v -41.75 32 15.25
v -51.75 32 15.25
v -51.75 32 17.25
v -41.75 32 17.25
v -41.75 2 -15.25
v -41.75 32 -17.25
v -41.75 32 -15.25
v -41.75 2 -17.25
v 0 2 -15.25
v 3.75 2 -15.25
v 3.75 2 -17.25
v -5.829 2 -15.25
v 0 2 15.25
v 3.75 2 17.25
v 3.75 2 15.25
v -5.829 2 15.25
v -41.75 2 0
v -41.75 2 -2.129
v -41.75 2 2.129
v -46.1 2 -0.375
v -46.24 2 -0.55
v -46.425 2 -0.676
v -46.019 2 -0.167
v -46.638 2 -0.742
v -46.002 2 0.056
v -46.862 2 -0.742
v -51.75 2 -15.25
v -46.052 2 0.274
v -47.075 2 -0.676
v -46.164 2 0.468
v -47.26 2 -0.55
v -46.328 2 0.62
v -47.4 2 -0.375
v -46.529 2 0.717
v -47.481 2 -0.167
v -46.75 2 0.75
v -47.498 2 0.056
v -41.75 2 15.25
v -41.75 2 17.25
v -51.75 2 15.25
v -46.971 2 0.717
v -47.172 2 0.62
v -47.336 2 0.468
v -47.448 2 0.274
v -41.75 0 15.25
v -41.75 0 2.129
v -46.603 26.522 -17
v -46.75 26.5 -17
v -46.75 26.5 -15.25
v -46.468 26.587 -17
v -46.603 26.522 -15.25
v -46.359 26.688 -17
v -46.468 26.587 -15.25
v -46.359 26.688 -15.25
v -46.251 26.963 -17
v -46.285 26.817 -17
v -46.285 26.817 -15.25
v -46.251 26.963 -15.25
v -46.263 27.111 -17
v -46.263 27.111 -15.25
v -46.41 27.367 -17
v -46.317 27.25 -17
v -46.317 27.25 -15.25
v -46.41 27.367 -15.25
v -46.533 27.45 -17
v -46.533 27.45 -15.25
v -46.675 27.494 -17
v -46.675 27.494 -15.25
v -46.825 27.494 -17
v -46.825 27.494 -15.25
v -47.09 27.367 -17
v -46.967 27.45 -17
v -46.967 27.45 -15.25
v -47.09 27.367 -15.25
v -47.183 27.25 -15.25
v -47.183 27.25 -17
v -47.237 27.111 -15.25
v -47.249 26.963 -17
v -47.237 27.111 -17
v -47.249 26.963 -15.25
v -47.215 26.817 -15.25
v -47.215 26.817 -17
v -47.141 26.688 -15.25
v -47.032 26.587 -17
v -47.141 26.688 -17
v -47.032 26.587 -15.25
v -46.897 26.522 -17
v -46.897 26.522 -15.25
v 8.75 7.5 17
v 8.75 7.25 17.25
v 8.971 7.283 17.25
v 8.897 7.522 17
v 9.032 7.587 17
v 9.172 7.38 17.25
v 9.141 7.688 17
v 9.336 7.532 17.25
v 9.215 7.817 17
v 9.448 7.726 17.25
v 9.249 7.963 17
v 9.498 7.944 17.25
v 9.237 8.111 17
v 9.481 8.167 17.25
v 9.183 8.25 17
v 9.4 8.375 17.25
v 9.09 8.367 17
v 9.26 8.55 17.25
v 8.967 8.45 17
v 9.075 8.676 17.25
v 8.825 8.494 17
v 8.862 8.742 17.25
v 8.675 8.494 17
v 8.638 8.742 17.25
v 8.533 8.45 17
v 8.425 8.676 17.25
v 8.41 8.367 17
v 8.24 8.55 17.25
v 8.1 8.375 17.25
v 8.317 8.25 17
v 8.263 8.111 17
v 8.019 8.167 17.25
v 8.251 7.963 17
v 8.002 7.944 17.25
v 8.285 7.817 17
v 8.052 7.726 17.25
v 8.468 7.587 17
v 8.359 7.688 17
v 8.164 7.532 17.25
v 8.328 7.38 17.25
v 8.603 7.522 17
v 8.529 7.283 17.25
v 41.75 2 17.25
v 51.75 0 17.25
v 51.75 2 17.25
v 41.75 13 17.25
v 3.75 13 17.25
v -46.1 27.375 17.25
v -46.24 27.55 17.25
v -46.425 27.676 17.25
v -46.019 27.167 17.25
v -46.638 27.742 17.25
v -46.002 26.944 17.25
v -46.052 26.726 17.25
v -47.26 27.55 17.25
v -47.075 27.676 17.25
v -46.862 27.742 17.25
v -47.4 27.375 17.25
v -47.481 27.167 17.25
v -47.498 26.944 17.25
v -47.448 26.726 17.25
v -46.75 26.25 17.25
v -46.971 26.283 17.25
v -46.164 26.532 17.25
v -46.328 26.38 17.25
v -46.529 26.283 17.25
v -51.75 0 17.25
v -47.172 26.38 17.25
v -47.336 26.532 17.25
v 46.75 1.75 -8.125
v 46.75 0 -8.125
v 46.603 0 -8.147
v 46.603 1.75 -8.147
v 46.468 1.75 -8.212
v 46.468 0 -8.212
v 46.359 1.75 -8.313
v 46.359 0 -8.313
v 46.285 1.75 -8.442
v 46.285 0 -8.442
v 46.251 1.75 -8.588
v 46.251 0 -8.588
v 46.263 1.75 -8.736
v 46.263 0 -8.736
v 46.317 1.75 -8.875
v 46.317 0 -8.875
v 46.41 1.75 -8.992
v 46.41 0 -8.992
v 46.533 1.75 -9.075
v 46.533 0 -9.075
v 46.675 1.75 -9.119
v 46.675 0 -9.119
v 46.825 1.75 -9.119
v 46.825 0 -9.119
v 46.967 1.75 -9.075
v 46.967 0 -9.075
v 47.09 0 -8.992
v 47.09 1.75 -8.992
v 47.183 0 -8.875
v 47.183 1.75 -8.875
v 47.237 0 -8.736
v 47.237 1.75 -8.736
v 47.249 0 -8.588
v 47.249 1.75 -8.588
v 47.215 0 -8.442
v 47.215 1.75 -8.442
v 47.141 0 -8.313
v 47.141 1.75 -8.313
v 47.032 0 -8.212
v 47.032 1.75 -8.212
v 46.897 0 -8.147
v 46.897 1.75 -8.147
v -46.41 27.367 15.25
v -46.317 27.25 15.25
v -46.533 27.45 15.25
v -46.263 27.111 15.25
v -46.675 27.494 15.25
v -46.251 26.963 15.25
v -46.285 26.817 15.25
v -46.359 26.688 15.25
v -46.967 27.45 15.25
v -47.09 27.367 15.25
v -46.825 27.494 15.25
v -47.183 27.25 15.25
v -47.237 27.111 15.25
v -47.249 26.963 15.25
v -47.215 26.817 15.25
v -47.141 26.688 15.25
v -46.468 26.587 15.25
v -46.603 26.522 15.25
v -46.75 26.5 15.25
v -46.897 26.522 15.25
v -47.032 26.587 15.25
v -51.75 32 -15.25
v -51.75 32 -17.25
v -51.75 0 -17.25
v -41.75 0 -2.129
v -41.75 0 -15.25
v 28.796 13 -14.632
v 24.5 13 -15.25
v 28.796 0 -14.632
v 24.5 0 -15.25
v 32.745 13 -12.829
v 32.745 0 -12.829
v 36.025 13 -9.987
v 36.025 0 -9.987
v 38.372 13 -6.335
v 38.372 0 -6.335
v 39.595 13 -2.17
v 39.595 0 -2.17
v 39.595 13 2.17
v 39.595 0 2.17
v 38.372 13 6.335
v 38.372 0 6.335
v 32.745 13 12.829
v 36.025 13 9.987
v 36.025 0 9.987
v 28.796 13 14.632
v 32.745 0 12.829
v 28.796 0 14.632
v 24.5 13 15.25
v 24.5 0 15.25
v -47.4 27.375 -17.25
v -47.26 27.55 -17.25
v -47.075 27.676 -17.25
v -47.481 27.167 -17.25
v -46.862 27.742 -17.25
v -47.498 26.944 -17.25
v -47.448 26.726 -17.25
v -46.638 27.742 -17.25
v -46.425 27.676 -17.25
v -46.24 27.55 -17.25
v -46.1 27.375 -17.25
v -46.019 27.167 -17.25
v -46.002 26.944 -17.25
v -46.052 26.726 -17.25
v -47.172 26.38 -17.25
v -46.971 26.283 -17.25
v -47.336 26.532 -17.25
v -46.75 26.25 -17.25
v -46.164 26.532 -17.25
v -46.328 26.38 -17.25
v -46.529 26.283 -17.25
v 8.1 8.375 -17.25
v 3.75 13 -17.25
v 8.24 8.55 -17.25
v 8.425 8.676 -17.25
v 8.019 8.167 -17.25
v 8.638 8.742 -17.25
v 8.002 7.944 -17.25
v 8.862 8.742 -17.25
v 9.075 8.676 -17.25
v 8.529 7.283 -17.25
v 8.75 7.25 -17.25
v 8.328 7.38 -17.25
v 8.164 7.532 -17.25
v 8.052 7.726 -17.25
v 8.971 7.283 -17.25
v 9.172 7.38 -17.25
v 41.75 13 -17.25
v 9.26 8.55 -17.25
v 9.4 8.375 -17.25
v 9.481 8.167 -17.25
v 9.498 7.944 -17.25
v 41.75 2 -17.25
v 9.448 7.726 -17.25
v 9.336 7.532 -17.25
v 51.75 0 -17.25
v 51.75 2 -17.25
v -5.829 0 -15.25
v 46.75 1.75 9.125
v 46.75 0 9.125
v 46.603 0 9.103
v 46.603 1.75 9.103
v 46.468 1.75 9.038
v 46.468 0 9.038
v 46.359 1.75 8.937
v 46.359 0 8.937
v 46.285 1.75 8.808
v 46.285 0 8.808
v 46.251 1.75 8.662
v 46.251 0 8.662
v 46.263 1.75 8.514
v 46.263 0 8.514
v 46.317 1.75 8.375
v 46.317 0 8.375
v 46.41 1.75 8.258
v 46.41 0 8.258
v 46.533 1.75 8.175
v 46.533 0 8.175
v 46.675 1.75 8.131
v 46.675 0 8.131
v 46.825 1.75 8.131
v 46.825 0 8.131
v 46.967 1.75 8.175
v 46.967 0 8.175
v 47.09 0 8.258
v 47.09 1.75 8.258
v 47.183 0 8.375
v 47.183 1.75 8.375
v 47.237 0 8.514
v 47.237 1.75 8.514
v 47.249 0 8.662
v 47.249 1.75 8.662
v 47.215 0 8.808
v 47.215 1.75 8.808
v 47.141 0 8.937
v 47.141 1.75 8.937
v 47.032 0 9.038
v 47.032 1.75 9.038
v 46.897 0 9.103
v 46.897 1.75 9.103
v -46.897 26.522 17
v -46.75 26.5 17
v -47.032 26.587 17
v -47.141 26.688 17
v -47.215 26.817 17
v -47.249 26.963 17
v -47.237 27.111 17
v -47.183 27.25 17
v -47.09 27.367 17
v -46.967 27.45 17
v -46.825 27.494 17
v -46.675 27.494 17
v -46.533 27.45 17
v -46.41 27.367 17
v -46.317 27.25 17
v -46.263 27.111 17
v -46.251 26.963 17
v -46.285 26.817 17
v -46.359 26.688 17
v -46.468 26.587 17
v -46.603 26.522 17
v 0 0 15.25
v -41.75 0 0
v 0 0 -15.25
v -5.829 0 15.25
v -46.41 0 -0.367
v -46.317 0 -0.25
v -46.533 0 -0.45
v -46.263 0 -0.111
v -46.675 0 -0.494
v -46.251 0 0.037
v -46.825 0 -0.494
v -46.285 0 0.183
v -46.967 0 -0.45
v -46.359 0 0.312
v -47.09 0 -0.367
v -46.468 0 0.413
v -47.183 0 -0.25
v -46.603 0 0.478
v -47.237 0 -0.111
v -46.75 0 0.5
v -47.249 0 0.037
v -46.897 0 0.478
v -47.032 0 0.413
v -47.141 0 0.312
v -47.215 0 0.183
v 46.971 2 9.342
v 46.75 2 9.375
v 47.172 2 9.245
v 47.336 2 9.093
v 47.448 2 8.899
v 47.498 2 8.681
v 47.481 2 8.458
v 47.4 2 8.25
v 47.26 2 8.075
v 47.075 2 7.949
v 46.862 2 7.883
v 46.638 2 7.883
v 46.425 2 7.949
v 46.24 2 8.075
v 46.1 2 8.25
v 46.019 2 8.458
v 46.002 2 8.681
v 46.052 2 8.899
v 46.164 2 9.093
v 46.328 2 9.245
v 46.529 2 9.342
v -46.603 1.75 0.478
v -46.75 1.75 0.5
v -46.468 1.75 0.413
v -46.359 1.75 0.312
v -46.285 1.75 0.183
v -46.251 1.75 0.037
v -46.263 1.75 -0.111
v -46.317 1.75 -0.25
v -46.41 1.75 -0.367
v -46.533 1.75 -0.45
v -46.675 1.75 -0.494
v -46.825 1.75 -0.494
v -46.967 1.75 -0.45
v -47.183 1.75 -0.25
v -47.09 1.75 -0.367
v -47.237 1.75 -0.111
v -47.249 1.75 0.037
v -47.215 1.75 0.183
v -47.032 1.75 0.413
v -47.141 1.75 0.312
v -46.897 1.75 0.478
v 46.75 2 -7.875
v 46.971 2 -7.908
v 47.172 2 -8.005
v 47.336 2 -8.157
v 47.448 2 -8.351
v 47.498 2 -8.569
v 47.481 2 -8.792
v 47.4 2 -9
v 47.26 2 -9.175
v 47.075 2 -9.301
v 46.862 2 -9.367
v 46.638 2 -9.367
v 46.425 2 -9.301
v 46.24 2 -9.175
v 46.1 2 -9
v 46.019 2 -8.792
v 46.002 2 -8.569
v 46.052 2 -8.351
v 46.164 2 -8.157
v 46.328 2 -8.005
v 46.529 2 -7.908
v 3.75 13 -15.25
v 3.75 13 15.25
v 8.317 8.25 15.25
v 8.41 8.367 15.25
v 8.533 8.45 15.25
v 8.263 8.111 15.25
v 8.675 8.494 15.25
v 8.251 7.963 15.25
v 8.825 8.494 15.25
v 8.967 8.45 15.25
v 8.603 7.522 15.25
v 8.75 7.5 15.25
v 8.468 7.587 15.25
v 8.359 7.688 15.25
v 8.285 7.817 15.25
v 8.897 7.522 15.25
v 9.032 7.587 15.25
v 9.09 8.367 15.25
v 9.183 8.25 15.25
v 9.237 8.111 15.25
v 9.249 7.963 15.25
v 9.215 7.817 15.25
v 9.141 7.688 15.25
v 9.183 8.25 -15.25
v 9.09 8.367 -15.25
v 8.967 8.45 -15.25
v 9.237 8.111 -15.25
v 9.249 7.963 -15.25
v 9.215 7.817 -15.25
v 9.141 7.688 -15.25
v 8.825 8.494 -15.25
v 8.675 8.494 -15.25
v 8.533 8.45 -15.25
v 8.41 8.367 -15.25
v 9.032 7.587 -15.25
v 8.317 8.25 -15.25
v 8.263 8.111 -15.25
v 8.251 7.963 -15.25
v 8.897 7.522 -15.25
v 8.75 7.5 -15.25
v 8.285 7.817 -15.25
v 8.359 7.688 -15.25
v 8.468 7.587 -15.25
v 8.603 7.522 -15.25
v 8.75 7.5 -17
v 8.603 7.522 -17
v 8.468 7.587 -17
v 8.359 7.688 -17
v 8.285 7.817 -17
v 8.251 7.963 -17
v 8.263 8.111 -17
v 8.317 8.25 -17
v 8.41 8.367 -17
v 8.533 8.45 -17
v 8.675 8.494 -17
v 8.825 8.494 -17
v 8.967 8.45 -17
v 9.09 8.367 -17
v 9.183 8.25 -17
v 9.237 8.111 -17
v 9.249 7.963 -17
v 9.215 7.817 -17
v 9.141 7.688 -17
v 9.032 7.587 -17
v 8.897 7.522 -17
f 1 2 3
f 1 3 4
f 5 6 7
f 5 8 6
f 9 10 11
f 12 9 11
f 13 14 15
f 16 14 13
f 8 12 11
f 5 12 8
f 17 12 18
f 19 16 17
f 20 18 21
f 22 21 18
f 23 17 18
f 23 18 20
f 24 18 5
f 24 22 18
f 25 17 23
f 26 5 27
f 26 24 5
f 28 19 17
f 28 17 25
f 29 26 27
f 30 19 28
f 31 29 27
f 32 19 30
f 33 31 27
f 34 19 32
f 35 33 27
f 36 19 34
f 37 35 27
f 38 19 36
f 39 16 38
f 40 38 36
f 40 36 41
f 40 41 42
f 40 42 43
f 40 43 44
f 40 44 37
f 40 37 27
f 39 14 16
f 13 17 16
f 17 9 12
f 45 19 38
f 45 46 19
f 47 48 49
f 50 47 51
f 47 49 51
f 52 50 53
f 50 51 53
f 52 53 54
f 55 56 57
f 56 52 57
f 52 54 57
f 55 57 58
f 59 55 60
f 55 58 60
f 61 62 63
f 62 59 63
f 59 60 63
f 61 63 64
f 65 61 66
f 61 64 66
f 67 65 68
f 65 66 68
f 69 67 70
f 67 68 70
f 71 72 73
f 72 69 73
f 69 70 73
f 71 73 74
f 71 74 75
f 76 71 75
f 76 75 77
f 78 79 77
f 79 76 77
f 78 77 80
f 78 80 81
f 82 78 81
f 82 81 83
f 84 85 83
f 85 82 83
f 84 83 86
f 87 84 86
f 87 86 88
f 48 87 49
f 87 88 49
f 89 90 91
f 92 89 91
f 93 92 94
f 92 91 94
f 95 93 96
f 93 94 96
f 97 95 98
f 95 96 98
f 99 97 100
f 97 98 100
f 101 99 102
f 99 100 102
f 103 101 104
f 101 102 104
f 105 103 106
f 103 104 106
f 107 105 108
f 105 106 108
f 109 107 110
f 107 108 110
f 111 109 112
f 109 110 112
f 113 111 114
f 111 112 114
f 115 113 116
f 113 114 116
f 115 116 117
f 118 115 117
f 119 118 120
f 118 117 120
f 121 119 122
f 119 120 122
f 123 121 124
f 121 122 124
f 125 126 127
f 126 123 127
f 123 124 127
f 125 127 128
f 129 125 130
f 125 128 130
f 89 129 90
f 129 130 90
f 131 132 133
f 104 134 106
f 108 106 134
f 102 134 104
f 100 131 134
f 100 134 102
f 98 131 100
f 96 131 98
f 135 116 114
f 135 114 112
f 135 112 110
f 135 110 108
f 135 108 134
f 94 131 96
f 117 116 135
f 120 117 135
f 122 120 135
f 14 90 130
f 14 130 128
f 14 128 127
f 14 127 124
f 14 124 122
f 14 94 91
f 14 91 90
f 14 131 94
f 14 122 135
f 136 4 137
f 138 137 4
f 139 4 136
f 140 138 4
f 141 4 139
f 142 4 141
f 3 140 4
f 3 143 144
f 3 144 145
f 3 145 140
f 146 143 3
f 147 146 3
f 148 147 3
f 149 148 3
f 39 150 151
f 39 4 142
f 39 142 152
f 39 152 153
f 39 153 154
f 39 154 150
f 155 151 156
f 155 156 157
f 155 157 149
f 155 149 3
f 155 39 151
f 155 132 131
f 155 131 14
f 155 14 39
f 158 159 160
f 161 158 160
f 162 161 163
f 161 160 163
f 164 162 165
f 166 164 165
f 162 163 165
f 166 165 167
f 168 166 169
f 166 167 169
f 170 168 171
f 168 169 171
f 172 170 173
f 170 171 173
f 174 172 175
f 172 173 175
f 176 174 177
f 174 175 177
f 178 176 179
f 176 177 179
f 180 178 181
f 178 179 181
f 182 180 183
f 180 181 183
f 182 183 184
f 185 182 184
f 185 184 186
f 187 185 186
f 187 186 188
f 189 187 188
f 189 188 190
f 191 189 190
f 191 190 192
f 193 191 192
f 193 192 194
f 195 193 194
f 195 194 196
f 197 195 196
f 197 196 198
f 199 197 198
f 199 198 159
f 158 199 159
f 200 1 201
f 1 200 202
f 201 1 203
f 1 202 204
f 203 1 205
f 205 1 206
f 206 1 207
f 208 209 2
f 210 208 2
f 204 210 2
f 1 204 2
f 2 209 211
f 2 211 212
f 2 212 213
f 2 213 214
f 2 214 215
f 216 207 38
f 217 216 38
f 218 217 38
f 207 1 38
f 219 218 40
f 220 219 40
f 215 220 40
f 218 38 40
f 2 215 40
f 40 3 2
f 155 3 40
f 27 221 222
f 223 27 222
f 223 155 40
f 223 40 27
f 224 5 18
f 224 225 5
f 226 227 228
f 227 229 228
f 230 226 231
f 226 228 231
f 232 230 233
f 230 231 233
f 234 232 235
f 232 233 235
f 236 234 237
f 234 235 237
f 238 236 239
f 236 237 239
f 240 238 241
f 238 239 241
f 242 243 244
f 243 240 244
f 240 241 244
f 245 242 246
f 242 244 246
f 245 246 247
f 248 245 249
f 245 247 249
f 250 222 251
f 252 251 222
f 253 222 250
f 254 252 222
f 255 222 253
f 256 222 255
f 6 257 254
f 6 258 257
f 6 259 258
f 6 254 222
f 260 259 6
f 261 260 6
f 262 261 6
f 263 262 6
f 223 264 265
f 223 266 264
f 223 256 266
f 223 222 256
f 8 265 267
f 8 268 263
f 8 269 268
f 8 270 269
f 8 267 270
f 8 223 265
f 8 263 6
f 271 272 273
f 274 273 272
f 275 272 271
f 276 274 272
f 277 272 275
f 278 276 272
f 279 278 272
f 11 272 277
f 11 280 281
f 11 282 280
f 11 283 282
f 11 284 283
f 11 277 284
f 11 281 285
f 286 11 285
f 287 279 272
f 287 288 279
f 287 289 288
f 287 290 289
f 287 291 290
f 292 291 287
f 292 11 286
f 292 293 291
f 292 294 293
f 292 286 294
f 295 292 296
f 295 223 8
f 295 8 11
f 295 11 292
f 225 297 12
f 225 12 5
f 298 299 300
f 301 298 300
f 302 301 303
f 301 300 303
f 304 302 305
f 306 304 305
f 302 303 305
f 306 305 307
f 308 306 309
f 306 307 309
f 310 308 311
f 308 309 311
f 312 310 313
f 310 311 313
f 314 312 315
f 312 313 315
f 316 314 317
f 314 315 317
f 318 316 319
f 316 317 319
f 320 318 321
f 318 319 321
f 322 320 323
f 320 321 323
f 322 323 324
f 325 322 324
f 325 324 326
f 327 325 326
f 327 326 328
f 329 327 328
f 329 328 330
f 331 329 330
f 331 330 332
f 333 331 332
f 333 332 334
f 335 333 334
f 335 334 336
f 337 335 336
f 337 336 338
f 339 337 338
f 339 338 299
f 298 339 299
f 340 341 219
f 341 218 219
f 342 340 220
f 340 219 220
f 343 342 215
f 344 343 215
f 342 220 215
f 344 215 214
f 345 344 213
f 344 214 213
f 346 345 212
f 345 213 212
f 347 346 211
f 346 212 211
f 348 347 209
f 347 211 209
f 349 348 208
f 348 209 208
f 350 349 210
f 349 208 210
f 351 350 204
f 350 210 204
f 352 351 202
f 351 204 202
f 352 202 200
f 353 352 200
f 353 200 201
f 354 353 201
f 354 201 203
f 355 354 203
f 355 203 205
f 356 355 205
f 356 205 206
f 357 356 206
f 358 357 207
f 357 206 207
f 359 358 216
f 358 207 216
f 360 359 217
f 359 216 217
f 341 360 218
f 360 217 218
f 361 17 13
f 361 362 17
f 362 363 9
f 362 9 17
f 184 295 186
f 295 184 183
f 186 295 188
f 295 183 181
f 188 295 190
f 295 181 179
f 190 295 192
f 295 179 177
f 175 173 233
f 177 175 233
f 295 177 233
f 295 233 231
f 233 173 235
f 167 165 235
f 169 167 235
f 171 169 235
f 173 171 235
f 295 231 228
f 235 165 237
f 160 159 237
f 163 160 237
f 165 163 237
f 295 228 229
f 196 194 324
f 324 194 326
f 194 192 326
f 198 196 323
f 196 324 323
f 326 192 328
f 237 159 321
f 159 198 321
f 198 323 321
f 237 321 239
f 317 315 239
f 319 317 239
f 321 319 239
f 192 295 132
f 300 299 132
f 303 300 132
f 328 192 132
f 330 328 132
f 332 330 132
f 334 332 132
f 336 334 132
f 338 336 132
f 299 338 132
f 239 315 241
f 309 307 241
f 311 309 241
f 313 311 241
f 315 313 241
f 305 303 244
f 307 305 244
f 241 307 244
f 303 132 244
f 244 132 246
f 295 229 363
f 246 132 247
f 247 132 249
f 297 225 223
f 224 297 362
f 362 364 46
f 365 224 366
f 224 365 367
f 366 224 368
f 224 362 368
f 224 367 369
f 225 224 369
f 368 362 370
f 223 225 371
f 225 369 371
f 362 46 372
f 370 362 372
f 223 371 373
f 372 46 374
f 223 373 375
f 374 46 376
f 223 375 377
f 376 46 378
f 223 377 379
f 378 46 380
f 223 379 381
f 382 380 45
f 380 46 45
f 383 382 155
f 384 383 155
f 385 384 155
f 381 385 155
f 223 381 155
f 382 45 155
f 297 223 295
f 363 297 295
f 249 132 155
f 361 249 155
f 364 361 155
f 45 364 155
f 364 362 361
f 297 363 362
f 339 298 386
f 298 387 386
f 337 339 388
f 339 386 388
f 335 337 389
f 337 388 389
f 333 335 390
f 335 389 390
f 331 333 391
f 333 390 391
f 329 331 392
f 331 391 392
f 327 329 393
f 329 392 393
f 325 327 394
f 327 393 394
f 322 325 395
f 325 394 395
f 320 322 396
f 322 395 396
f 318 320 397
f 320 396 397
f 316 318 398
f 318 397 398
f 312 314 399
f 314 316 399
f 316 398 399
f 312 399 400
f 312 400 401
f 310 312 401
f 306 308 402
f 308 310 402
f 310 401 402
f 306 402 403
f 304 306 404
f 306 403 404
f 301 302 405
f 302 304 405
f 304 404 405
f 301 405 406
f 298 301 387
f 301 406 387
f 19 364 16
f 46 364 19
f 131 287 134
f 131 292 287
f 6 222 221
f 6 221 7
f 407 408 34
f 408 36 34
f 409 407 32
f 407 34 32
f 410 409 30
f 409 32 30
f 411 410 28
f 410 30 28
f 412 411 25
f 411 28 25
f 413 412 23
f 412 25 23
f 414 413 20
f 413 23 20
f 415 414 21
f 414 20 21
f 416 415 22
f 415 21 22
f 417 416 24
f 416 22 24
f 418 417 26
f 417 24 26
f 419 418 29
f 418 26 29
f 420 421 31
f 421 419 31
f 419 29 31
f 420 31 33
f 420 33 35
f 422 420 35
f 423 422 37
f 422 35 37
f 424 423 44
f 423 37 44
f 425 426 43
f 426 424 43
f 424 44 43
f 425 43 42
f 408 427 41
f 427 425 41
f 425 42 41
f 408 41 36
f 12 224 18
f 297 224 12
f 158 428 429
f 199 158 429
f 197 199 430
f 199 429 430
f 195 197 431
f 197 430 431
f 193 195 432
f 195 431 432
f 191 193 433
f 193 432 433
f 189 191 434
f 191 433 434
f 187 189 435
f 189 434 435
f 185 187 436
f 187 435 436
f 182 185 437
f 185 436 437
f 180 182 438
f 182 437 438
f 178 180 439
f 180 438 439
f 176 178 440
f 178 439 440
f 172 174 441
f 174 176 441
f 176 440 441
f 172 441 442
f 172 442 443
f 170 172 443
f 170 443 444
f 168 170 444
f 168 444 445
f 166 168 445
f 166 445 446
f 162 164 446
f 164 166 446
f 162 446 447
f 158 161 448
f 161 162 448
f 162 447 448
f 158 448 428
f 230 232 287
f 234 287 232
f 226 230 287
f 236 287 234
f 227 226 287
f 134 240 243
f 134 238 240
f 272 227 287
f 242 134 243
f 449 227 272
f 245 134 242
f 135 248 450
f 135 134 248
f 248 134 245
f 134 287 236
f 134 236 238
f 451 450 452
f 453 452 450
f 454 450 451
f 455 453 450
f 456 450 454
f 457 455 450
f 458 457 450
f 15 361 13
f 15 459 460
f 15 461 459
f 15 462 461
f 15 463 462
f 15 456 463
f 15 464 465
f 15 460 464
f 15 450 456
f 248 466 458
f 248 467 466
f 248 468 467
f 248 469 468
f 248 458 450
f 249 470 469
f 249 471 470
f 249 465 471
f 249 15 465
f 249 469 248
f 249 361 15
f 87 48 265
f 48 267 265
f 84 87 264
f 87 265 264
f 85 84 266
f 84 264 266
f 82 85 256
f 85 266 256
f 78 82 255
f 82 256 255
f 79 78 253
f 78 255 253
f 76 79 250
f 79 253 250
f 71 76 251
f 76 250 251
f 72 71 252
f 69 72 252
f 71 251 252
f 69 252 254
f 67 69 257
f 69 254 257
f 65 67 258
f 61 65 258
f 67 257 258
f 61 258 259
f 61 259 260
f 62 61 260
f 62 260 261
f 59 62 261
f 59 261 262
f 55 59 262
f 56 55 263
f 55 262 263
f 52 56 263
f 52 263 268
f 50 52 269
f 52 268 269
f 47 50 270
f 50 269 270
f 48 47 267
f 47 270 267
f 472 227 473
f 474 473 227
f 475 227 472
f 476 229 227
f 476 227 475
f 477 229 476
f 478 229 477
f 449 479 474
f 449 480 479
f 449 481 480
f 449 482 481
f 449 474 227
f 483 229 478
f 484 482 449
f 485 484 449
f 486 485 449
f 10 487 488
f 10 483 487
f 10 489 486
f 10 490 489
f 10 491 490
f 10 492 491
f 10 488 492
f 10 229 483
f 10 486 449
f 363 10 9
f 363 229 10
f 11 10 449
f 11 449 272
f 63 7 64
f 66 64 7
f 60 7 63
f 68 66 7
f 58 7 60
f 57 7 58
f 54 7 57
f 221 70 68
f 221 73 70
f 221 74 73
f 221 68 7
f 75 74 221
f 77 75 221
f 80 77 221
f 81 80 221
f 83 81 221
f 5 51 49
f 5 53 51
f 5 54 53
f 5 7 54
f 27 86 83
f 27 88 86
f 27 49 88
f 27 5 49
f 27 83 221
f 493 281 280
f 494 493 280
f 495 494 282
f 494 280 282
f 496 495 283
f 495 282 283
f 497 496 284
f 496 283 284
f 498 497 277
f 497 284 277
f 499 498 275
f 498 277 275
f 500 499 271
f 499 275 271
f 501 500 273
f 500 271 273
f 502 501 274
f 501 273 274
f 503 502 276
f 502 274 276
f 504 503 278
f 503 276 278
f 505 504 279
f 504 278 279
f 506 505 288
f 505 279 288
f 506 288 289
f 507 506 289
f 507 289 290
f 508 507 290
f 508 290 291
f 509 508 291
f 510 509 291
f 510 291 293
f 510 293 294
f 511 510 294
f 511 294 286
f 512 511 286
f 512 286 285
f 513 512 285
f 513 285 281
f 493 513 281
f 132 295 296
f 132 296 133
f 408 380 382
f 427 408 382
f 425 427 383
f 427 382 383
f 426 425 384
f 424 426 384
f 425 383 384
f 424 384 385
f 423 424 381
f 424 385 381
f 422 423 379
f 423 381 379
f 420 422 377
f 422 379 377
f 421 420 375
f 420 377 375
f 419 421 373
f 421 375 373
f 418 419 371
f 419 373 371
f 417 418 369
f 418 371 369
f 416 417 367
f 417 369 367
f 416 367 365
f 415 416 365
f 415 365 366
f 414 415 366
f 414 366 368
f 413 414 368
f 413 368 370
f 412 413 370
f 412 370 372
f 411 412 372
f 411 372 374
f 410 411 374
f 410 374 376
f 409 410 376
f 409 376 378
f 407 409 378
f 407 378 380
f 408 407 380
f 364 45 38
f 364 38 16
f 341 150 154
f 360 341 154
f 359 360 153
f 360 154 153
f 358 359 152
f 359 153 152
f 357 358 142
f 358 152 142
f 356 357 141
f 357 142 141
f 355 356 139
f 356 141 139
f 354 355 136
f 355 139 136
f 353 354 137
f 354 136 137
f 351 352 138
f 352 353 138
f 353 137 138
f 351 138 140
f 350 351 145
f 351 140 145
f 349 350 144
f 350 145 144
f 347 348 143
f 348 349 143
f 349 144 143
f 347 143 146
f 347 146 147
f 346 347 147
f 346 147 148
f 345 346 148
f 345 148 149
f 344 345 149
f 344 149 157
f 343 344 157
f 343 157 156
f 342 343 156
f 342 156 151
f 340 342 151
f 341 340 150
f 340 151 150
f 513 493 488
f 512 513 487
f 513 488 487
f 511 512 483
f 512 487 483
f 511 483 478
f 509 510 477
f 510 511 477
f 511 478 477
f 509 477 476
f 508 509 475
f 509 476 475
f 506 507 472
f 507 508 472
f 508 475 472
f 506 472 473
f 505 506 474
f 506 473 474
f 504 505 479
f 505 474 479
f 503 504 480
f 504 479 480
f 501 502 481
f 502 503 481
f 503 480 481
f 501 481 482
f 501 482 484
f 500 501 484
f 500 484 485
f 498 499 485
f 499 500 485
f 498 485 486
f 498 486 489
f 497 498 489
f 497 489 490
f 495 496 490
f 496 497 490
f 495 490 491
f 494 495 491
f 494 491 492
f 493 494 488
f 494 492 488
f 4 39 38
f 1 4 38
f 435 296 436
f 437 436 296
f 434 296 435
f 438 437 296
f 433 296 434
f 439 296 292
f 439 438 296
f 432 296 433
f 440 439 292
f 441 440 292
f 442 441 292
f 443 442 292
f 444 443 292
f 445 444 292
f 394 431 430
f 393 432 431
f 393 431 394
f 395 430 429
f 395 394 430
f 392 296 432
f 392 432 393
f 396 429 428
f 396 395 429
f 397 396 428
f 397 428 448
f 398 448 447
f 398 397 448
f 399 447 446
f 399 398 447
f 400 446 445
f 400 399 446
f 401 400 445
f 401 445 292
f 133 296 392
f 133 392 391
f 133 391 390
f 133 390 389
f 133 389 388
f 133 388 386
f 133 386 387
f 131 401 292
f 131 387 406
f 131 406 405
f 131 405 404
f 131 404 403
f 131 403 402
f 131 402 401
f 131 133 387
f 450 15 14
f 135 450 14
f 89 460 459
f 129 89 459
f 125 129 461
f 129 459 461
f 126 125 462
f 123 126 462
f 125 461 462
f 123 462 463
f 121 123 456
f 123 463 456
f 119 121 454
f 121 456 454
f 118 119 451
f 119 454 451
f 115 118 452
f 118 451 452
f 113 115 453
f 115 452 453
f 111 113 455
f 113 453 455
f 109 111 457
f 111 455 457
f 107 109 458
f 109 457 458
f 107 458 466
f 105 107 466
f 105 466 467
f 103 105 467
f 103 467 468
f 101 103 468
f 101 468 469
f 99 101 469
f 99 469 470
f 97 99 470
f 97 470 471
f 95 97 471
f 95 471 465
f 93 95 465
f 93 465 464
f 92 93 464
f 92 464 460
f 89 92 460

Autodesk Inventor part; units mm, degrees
ref_plane "YZ Plane" through (0, 0, 0) normal (1, 0, 0) x (0, 1, 0)
ref_plane "XZ Plane" through (0, 0, 0) normal (0, 1, 0) x (-1, 0, 0)
ref_plane "XY Plane" through (0, 0, 0) normal (0, 0, 1) x (1, 0, 0)
sketch "Эскиз1" plane through (0, 0, 0) normal (0, 1, 0) x (-1, 0, 0)
  line L0 (-51.75, 17.25) -> (51.75, 17.25)
  line L1 (51.75, 17.25) -> (51.75, -17.25)
  line L2 (51.75, -17.25) -> (-51.75, -17.25)
  line L3 (-51.75, -17.25) -> (-51.75, 17.25)
  line L4 (-51.75, 17.25) -> (51.75, -17.25) construction
  line L5 (51.75, 17.25) -> (-51.75, -17.25) construction
  line L6 (-41.75, -15.25) -> (0, -15.25)
  line L7 (41.75, -15.25) -> (41.75, -2.1292)
  line L8 (41.75, 15.25) -> (5.8292, 15.25)
  line L9 (-41.75, 15.25) -> (-41.75, -15.25)
  line L10 (0, -24.15) -> (0, 24.15) construction
  line L11 (0, -17.25) -> (0, -15.25) construction
  line L12 (0, 15.25) -> (0, 17.25) construction
  line L13 (0, -15.25) -> (41.75, 0)
  line L14 (41.75, 0) -> (0, 15.25)
  line L15 (5.8292, 15.25) -> (41.75, 2.1292)
  line L16 (41.75, -2.1292) -> (5.8292, -15.25)
  line L17 (41.75, -2.1292) -> (41.75, 2.1292) construction
  line L18 (41.75, 2.1292) -> (41.75, 15.25)
  line L19 (5.8292, -15.25) -> (41.75, -15.25)
  line L20 (0, -15.25) -> (5.8292, -15.25) construction
  line L21 (5.8292, 15.25) -> (0, 15.25) construction
  line L22 (0, 15.25) -> (-41.75, 15.25)
  line L23 (41.75, -2.1292) -> (41.0638, -0.2506) construction
  line L24 (41.75, 2.1292) -> (41.0638, 0.2506) construction
  point P0 (0, 0)
  point P1 (0, 0)
  dimension "d0" = 103.5
  dimension "d4" = 10
  dimension "d5" = 10
  dimension "d24" = 30.5
  dimension "d28" = 2
extrude "Выдавливание1" add sketch "Эскиз1" along normal blind 2
sketch "Эскиз2" plane through (0, 0, 0) normal (0, 1, 0) x (-1, 0, 0)
  line L0 (-41.75, -17.25) -> (-41.75, 17.25)
  line L1 (51.75, 17.25) -> (-51.75, 17.25) projected
  line L2 (-51.75, 17.25) -> (-51.75, -17.25) projected
  line L3 (0, -15.25) -> (-41.75, -15.25) construction
  line L4 (-39.75, -15.25) -> (-39.75, 15.25) construction
  line L5 (5.8292, 15.25) -> (41.75, 15.25) construction
  line L6 (-39.75, -15.25) -> (-24.5, -15.25) construction
  line L7 (-3.75, -15.25) -> (-3.75, -17.25)
  line L8 (-51.75, -17.25) -> (51.75, -17.25) projected
  line L9 (-3.75, -17.25) -> (-41.75, -17.25)
  line L10 (-41.75, 17.25) -> (-3.75, 17.25)
  line L11 (-3.75, 15.25) -> (-24.5, 15.25)
  line L12 (-3.75, 15.25) -> (-3.75, 17.25)
  arc A0 (-24.5, 15.25) -> (-24.5, -15.25) centre (-24.5, 0) ccw
  line L13 (-24.5, -15.25) -> (-3.75, -15.25)
  line L14 (-24.5, 15.25) -> (-39.75, 15.25) construction
  line L15 (-41.75, -15.25) -> (-41.75, 15.25) projected
  point P0 (0, 0)
  point P1 (41.75, -15.25)
  dimension "d13" = 2
  dimension "d14" = 36
extrude "Выдавливание2" add sketch "Эскиз2" along normal blind 13 contours L0 L1 L12 L11 A0 L13 L7 L8
sketch "Эскиз3" plane through (0, 2, 0) normal (0, 1, 0) x (1, 0, 0)
  line L0 (-41.75, 15.25) -> (-51.75, 15.25)
  line L1 (-51.75, 15.25) -> (-51.75, 17.25)
  line L2 (-51.75, 17.25) -> (-41.75, 17.25)
  line L3 (-41.75, 17.25) -> (-41.75, 15.25)
  line L4 (-51.75, 17.25) -> (-51.75, -17.25) construction
  line L5 (-51.75, -17.25) -> (-41.75, -17.25)
  line L6 (-41.75, -17.25) -> (-41.75, -15.25)
  line L7 (-41.75, -15.25) -> (-51.75, -15.25)
  line L8 (-51.75, -15.25) -> (-51.75, -17.25)
  point P0 (0, 0)
  point P1 (3.75, -15.25)
extrude "Выдавливание3" add sketch "Эскиз3" along normal blind 30
sketch "Эскиз5" plane through (0, 2, 0) normal (0, 1, 0) x (1, 0, 0)
  line L0 (51.75, 17.25) -> (51.75, -17.25) construction
  line L1 (51.75, -17.25) -> (41.75, -17.25) construction
  line L2 (41.75, 17.25) -> (41.75, -17.25) construction
  line L3 (3.75, 17.25) -> (41.75, 17.25) construction
  line L4 (3.75, 15.25) -> (3.75, 17.25) construction
  line L5 (3.75, 15.25) -> (0, 15.25) construction
  line L6 (0, 15.25) -> (-41.75, 0) construction
  line L7 (-41.75, 0) -> (0, -15.25) construction
  line L8 (0, -15.25) -> (3.75, -15.25) construction
  line L9 (3.75, -15.25) -> (24.5, -15.25) construction
  arc A0 (24.5, -15.25) -> (24.5, 15.25) centre (24.5, 0) ccw construction
  line L10 (24.5, 15.25) -> (3.75, 15.25) construction
  line L11 (41.75, 17.25) -> (51.75, 17.25) construction
  line L12 (41.75, -17.25) -> (3.75, -17.25) construction
  line L13 (3.75, -17.25) -> (3.75, -15.25) construction
  line L14 (-41.75, 17.25) -> (3.75, 17.25) construction
  line L15 (-41.75, 17.25) -> (-41.75, 15.25) construction
  line L16 (-5.8292, 15.25) -> (-41.75, 15.25) construction
  line L17 (-41.75, 2.1292) -> (-5.8292, 15.25) construction
  line L18 (-41.75, 15.25) -> (-41.75, 2.1292) construction
  line L19 (-41.75, 15.25) -> (-51.75, 15.25) construction
  line L20 (-51.75, 15.25) -> (-51.75, 17.25) construction
  line L21 (-51.75, 17.25) -> (-41.75, 17.25) construction
  line L22 (3.75, -17.25) -> (-41.75, -17.25) construction
  line L23 (-41.75, -15.25) -> (-41.75, -17.25) construction
  line L24 (-51.75, -15.25) -> (-41.75, -15.25) construction
  line L25 (-51.75, -17.25) -> (-51.75, -15.25) construction
  line L26 (-41.75, -17.25) -> (-51.75, -17.25) construction
  line L27 (-51.75, -15.25) -> (-51.75, 15.25) construction
  line L28 (-41.75, -15.25) -> (-5.8292, -15.25) construction
  line L29 (-5.8292, -15.25) -> (-41.75, -2.1292) construction
  line L30 (-41.75, -2.1292) -> (-41.75, -15.25) construction
  line L31 (-51.75, 17.25) -> (-41.75, -17.25) construction
  line L32 (-41.75, 17.25) -> (-51.75, -17.25) construction
  line L33 (51.75, 17.25) -> (-51.75, 17.25) construction
  line L34 (51.75, 17.25) -> (41.75, 0) construction
  line L35 (41.75, 17.25) -> (51.75, 0) construction
  line L36 (51.75, -17.25) -> (51.75, 17.25) construction
  line L37 (51.75, -17.25) -> (41.75, 0) construction
  line L38 (41.75, -17.25) -> (51.75, 0) construction
  circle A1 centre (-46.75, 0) radius 0.5
  circle A2 centre (46.75, 8.625) radius 0.5
  circle A3 centre (46.75, -8.625) radius 0.5
  point P0 (0, 0)
  dimension "d29" = 1
hole "Отверстие1" at (-46.75, 2, 0) at (46.75, 2, 8.625) at (46.75, 2, -8.625) direction (0, -1, 0) diameter 1 end through all countersink diameter 1.5 countersink angle 90
sketch "Эскиз4" plane through (-51.75, 0, 17.25) normal (0, 0, 1) x (1, 0, 0)
  line L0 (10, 32) -> (0, 32) construction
  line L1 (0, 32) -> (10, 32) construction
  line L2 (10, 32) -> (10, 22) construction
  line L3 (10, 22) -> (0, 22) construction
  line L4 (0, 22) -> (0, 32) construction
  line L5 (103.5, 0) -> (0, 0) construction
  line L6 (0, 0) -> (0, 32) construction
  line L7 (10, 32) -> (10, 2) construction
  line L8 (10, 2) -> (55.5, 2) construction
  line L9 (55.5, 2) -> (55.5, 13) construction
  line L10 (55.5, 13) -> (93.5, 13) construction
  line L11 (93.5, 13) -> (93.5, 2) construction
  line L12 (93.5, 2) -> (103.5, 2) construction
  line L13 (103.5, 2) -> (103.5, 0) construction
  line L14 (10, 2) -> (10, 32) construction
  line L15 (0, 0) -> (0, 32) construction
  line L16 (10, 22) -> (0, 32) construction
  line L17 (10, 32) -> (0, 22) construction
  circle A0 centre (5, 27) radius 0.5
  line L18 (55.5, 13) -> (65.5, 13) construction
  line L19 (65.5, 13) -> (65.5, 3) construction
  line L20 (65.5, 3) -> (55.5, 3) construction
  line L21 (55.5, 3) -> (55.5, 13) construction
  line L22 (65.5, 13) -> (55.5, 3) construction
  line L23 (55.5, 2) -> (55.5, 13) construction
  line L24 (55.5, 13) -> (65.5, 3) construction
  circle A1 centre (60.5, 8) radius 0.5
  line L25 (0, 32) -> (10, 32) projected
  point P0 (51.75, 0)
  dimension "d19" = 1
  dimension "d20" = 10
  dimension "d21" = 1
hole "Отверстие2" at (-46.75, 27, 17.25) at (8.75, 8, 17.25) direction (0, 0, -1) diameter 1 depth 17.25 countersink diameter 1.5 countersink angle 90
mirror "Зеркальное отражение1" about plane through (0, 0, 0) normal (0, 0, 1) of "Отверстие2"
properties part number "frame"
